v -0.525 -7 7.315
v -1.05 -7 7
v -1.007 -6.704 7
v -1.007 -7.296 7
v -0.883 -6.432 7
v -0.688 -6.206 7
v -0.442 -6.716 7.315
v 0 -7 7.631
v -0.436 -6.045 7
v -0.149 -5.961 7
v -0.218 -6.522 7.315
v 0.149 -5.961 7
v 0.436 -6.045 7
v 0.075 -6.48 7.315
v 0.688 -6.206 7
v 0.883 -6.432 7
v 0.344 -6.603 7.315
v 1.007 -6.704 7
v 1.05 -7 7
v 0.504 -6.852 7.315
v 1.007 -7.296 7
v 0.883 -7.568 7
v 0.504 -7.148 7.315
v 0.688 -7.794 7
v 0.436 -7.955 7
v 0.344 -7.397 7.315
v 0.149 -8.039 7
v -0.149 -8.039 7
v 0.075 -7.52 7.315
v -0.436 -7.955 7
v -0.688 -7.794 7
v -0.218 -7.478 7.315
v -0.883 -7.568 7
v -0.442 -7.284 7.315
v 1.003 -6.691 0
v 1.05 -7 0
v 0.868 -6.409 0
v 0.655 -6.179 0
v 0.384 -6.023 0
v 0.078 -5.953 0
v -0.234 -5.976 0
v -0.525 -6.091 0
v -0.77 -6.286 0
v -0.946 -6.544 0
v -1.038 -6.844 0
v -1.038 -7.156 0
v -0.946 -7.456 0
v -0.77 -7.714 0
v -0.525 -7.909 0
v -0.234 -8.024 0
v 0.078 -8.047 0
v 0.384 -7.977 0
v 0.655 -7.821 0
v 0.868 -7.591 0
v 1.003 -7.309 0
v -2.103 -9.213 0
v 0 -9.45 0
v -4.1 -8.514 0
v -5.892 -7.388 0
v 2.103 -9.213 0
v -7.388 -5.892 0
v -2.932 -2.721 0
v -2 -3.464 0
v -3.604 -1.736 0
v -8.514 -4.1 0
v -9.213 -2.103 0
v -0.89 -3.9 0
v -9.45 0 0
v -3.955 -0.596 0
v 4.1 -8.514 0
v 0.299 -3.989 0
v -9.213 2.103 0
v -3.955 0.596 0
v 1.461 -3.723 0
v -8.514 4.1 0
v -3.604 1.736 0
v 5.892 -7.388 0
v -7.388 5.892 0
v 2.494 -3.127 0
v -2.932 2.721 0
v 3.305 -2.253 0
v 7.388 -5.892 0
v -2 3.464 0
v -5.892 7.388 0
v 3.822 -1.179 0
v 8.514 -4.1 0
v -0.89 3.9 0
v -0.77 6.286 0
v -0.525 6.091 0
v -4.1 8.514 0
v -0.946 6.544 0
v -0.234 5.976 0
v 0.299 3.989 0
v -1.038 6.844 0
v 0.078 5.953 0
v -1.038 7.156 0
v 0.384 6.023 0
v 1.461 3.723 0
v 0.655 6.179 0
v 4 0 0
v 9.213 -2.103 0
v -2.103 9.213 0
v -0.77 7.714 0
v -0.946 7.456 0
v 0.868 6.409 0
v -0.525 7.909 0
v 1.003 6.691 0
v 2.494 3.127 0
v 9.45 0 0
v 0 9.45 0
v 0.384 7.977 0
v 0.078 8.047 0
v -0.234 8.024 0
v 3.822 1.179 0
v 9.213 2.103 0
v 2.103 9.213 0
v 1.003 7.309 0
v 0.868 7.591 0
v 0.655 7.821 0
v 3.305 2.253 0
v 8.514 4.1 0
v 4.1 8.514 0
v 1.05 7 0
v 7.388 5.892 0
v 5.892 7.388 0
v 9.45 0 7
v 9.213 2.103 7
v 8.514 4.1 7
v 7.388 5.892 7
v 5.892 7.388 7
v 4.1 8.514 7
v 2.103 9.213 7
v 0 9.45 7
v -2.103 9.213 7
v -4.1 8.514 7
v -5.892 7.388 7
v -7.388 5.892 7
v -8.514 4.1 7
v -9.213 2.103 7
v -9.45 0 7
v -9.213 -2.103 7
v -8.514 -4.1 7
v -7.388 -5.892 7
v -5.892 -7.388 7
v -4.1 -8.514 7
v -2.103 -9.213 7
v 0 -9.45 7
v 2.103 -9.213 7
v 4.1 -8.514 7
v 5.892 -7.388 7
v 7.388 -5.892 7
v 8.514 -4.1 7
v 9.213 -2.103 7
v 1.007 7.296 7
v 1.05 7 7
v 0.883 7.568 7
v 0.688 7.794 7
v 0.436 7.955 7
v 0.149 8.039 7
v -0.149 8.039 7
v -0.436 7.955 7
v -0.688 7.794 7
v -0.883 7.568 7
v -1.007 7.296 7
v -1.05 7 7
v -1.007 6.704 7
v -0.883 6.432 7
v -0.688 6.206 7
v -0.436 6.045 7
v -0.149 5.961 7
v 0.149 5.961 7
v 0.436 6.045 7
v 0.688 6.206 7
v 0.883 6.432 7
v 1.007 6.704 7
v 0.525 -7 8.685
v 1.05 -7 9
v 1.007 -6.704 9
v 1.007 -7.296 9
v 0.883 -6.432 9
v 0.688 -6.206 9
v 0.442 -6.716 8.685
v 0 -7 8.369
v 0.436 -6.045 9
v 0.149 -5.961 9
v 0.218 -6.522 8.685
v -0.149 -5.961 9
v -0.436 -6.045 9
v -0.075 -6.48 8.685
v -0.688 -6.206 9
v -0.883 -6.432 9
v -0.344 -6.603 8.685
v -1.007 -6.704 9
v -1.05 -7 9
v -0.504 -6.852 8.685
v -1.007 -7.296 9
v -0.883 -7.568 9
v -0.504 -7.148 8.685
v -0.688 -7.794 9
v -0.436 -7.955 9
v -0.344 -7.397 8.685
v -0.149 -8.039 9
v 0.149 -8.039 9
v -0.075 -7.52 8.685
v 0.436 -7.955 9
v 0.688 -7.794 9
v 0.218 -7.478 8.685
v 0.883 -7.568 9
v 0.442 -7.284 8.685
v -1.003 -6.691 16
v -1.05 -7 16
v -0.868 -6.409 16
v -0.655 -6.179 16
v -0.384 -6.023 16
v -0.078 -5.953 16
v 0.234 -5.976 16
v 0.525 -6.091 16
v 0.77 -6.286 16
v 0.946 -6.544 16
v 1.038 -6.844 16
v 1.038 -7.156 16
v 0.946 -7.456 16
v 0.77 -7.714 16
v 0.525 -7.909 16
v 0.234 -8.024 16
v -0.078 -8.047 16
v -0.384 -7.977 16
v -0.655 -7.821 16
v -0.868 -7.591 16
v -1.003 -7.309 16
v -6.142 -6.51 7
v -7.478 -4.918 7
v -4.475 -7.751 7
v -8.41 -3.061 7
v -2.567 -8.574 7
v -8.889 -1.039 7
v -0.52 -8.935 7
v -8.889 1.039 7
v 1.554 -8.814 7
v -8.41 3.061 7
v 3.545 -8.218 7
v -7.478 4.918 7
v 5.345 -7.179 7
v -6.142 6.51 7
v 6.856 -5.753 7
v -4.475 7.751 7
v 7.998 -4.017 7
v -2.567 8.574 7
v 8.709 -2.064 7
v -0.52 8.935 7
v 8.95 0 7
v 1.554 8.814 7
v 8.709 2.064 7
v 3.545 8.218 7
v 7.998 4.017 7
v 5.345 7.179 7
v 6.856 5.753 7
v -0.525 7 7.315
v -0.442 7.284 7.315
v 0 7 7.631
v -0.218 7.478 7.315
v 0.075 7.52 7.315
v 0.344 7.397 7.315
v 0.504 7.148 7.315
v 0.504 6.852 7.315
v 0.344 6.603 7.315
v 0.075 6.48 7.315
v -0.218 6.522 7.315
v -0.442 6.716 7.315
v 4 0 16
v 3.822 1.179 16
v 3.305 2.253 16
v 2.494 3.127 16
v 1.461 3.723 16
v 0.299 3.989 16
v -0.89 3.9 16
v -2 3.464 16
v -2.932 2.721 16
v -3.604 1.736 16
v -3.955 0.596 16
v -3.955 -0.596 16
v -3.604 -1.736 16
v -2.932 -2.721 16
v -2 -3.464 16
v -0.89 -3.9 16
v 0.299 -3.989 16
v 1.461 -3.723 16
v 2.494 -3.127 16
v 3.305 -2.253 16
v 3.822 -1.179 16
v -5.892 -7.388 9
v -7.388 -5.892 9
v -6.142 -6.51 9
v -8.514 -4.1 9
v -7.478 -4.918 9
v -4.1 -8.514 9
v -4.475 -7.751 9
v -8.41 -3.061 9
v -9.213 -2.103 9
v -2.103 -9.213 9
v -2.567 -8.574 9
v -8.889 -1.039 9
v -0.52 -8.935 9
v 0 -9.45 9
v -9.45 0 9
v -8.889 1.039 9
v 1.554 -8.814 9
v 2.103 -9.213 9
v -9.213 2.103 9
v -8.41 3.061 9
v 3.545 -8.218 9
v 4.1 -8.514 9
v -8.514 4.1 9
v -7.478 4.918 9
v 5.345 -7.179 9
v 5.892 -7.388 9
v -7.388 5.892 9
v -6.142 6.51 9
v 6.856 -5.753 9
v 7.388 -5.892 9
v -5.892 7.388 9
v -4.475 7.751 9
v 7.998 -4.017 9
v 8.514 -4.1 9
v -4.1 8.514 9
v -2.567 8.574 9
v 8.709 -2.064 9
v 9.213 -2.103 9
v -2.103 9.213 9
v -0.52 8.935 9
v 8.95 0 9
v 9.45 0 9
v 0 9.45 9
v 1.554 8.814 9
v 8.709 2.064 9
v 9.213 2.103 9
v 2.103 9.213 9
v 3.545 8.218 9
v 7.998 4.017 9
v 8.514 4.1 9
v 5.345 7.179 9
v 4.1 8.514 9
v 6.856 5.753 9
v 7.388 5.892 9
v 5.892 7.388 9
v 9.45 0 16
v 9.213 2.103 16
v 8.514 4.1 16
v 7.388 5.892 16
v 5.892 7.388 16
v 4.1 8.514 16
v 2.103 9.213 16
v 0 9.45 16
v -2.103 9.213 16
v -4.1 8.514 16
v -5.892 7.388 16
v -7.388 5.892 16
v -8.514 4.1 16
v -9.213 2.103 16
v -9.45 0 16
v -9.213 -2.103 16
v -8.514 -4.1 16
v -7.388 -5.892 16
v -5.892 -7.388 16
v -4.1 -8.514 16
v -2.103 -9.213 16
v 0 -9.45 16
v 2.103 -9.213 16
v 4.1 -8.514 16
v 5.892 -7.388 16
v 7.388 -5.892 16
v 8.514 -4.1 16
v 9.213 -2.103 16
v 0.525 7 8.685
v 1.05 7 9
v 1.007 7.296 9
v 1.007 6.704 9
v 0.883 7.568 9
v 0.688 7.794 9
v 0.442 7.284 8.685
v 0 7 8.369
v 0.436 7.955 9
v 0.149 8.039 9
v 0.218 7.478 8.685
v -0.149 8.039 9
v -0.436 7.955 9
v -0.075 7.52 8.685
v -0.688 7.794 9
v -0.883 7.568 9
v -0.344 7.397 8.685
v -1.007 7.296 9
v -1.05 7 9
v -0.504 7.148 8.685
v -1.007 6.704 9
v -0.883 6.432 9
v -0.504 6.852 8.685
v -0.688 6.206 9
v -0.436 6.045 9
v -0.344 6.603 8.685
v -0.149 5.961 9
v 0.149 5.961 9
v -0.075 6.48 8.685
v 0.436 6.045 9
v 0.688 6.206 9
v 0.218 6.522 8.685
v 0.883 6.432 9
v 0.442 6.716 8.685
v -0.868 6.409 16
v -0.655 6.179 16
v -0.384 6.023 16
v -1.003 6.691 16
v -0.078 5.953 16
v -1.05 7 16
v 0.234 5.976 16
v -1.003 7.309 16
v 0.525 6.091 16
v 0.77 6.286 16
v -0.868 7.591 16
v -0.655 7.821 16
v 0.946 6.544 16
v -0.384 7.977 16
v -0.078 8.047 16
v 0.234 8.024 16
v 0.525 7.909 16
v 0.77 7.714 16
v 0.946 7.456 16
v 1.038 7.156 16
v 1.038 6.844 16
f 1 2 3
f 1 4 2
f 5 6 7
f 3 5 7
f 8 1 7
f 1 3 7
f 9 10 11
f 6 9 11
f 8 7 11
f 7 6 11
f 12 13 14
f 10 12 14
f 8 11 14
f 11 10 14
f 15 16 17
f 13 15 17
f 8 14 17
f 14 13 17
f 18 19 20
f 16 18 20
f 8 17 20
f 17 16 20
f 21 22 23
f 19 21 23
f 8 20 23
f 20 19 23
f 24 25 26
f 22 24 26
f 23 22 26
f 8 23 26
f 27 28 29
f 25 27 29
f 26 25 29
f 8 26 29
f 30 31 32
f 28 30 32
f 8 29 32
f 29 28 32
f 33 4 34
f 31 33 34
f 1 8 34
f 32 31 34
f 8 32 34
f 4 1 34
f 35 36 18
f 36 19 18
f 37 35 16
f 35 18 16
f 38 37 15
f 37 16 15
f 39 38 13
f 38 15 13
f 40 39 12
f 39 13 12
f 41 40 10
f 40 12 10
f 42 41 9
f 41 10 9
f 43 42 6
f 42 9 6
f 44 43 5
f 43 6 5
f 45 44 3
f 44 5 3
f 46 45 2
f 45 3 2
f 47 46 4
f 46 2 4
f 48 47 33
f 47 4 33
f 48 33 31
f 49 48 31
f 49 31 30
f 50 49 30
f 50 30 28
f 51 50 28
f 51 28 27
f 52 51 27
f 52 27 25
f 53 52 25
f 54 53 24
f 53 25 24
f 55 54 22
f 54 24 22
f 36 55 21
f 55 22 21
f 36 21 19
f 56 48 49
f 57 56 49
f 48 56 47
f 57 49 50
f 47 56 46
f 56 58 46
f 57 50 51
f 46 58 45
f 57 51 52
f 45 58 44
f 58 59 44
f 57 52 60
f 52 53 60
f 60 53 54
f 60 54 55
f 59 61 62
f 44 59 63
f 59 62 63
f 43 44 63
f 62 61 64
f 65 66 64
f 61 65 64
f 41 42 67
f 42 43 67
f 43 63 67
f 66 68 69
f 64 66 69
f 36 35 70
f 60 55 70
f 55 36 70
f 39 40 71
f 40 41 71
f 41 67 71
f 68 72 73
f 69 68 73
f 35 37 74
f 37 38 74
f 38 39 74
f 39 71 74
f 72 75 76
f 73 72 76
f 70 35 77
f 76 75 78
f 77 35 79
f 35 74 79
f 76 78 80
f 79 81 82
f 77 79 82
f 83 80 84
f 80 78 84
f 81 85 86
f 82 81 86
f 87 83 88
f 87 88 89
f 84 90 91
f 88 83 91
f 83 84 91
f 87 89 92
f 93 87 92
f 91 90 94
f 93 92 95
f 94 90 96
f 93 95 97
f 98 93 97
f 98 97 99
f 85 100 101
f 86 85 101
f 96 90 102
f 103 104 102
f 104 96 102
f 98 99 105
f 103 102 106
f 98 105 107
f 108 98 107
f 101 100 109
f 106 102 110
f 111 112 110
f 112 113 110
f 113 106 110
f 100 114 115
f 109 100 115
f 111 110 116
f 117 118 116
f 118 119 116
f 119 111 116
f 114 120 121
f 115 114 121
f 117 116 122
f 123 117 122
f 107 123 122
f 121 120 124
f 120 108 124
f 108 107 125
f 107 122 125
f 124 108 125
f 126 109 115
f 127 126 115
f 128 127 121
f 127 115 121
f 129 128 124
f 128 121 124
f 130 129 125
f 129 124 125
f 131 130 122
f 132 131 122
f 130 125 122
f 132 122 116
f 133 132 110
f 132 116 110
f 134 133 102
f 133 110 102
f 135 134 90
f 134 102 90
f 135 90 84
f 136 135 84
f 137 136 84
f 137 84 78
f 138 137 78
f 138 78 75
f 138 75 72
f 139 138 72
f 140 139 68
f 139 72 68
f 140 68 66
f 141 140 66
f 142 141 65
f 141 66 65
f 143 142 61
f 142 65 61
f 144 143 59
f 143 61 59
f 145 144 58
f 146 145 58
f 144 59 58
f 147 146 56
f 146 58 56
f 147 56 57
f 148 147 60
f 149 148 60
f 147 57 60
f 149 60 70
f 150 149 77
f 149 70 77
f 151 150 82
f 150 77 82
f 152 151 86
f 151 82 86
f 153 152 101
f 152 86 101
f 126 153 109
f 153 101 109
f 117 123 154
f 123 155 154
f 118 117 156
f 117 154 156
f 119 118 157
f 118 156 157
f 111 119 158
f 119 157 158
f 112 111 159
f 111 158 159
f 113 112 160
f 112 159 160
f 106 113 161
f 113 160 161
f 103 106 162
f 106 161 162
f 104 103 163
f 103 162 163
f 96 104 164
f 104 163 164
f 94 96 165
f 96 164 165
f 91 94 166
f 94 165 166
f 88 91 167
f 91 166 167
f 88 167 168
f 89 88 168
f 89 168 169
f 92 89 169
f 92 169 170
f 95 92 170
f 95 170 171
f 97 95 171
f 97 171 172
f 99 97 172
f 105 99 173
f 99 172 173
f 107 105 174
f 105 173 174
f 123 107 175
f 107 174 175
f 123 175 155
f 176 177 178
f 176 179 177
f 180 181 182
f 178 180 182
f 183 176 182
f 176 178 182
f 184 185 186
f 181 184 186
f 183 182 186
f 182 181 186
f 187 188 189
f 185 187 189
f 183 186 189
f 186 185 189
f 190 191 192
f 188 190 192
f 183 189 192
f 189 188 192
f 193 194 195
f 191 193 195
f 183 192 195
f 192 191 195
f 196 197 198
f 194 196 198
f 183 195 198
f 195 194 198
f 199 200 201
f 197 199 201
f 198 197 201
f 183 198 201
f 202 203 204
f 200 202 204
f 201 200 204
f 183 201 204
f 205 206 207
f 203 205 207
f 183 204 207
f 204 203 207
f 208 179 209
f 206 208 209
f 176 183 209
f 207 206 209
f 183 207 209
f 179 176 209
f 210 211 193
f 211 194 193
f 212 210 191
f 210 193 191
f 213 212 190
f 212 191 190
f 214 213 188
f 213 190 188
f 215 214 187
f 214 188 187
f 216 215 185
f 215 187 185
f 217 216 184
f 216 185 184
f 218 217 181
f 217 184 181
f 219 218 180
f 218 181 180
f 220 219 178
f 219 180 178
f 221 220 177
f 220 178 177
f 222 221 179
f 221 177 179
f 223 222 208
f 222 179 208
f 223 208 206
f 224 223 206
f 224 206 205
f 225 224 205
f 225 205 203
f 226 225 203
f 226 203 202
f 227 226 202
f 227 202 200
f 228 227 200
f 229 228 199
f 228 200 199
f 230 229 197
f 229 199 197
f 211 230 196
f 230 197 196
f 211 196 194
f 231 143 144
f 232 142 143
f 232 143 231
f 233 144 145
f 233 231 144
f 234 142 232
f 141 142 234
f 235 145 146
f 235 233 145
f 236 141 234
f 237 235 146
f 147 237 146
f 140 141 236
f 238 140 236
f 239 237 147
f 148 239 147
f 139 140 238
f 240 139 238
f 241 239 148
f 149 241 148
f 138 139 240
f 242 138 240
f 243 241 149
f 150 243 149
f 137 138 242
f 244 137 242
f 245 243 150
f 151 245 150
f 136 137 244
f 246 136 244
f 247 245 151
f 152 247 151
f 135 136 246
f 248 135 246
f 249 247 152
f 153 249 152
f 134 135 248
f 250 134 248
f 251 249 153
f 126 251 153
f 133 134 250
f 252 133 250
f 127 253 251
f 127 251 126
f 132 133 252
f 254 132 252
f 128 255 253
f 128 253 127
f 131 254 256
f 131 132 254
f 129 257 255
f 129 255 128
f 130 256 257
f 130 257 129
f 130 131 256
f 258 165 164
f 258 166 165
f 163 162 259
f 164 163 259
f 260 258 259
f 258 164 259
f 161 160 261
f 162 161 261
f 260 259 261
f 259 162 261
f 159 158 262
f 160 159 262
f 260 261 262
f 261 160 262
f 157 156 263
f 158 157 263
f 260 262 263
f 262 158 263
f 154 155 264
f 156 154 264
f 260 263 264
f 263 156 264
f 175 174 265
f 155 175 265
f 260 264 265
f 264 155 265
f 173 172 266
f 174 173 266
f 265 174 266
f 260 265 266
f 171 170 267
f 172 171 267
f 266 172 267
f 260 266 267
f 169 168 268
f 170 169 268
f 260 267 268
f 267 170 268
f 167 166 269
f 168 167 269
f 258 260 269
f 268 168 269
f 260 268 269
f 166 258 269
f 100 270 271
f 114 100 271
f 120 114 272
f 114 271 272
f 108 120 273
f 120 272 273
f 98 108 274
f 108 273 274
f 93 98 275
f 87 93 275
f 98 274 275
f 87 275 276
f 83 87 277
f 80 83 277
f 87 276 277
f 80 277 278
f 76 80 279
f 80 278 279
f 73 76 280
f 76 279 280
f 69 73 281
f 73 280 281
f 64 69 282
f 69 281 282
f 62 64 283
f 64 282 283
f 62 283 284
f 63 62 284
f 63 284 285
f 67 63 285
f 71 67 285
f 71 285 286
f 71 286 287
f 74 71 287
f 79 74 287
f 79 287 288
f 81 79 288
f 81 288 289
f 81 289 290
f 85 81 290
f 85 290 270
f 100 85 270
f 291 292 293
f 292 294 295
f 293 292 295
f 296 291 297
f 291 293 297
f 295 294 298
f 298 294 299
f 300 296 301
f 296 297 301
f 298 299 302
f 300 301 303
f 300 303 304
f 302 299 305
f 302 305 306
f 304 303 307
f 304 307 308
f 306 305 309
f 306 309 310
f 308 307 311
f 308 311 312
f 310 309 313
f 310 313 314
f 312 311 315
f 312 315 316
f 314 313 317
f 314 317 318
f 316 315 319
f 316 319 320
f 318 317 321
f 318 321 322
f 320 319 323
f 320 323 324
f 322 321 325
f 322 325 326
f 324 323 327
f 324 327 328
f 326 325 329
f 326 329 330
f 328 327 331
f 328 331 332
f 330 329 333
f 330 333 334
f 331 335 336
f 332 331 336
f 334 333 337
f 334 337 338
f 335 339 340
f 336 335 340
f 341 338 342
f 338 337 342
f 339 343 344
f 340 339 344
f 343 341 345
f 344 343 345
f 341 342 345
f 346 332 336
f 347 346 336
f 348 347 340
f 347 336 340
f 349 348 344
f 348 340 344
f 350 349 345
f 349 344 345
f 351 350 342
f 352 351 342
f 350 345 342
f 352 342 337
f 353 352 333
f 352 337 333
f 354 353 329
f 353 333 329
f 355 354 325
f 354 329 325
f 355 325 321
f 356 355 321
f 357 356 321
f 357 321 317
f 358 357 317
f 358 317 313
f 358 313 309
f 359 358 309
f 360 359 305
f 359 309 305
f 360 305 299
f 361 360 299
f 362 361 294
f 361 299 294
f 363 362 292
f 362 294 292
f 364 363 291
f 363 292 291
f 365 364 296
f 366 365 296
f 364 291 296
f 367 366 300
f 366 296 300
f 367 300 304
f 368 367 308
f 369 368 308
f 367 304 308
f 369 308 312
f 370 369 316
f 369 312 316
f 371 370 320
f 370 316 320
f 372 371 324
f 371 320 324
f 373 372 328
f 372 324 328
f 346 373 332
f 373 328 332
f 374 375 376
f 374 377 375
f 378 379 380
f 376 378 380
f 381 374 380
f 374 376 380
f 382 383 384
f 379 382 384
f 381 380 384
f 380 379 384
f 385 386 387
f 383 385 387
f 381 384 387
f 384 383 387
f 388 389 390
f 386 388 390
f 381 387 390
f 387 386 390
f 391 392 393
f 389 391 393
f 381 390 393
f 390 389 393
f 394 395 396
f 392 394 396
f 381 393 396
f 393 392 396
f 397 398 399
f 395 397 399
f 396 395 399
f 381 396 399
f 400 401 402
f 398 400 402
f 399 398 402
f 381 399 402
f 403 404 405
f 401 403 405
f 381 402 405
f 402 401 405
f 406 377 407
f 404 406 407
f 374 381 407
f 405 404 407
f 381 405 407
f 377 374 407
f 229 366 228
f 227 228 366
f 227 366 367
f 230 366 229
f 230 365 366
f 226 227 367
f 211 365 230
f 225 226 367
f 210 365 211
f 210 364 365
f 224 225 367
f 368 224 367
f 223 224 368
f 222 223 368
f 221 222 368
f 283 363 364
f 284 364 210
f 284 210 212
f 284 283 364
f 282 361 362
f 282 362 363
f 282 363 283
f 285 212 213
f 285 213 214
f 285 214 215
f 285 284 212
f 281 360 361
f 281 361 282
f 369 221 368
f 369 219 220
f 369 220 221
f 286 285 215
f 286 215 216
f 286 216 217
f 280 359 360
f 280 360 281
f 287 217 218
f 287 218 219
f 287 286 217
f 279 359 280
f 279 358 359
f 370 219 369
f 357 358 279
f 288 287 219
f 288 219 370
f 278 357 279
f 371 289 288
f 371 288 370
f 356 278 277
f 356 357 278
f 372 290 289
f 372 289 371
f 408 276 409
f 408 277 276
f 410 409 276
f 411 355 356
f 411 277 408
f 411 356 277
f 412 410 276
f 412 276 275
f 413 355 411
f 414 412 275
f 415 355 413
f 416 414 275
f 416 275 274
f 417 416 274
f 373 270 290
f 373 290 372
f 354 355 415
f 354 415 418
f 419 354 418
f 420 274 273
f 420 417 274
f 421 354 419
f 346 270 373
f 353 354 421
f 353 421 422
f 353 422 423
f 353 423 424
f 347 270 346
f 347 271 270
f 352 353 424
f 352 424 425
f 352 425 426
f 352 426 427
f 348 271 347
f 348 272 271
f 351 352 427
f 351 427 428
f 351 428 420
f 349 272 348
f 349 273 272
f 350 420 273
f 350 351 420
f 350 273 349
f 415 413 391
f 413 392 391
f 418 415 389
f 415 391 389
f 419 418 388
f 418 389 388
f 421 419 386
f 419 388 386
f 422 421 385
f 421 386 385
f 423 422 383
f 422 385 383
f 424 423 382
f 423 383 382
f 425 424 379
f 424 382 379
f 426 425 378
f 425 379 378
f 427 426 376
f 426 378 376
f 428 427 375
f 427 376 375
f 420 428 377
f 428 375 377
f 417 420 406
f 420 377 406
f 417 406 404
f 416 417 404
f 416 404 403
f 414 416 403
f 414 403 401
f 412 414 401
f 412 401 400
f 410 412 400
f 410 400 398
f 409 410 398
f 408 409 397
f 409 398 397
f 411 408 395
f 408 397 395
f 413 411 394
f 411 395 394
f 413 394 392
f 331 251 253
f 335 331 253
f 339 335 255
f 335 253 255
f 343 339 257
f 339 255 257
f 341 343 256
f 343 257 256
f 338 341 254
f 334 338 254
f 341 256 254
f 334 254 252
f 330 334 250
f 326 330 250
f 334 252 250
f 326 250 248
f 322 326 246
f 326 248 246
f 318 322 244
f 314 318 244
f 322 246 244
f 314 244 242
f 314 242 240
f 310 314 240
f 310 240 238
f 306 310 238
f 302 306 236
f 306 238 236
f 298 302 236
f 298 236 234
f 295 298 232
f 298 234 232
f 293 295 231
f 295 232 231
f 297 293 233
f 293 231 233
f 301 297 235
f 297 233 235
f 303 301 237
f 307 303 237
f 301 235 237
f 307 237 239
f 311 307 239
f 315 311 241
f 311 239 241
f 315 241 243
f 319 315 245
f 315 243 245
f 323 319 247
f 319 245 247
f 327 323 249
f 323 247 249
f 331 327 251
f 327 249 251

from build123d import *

# Parameters (mm, degrees)
SKETCH1_R                    = 9.45
BOSS_EXTRUDE1_DEPTH          = 7
SKETCH2_R                    = 8.95
BOSS_EXTRUDE2_DEPTH          = 2
SKETCH3_R                    = 9.45
BOSS_EXTRUDE3_DEPTH          = 7
SKETCH4_R                    = 4
CUT_EXTRUDE1_DEPTH           = 21.847182064
M2_5X0_45_TAPPED_HOLE1_D     = 2.1
M2_5X0_45_TAPPED_HOLE1_DEPTH = 7
M2_5X0_45_TAPPED_HOLE1_TIP   = 0.63090365
M2_5X0_45_TAPPED_HOLE2_D     = 2.1
M2_5X0_45_TAPPED_HOLE2_DEPTH = 7
M2_5X0_45_TAPPED_HOLE2_TIP   = 0.63090365


with BuildPart() as part:
    # Sketch1 → Boss-Extrude1 (new body)
    with BuildSketch(Plane.XY):
        Circle(SKETCH1_R)
    extrude(amount=BOSS_EXTRUDE1_DEPTH)

    # Sketch2 → Boss-Extrude2 (add)
    with BuildSketch(Plane.XY.offset(7)):
        Circle(SKETCH2_R)
    extrude(amount=BOSS_EXTRUDE2_DEPTH)

    # Sketch3 → Boss-Extrude3 (add)
    with BuildSketch(Plane.XY.offset(9)):
        Circle(SKETCH3_R)
    extrude(amount=BOSS_EXTRUDE3_DEPTH)

    # Sketch4 → Cut-Extrude1 (cut, through all)
    with BuildSketch(Plane.XY.offset(16)):
        Circle(SKETCH4_R)
    extrude(amount=-CUT_EXTRUDE1_DEPTH, mode=Mode.SUBTRACT)

    # M2.5x0.45 Tapped Hole1
    with Locations(Plane.XY.offset(16)):
        with Locations((0, -7), (0, 7)):
            Hole(M2_5X0_45_TAPPED_HOLE1_D / 2, depth=M2_5X0_45_TAPPED_HOLE1_DEPTH)
            with Locations((0, 0, -(M2_5X0_45_TAPPED_HOLE1_DEPTH + M2_5X0_45_TAPPED_HOLE1_TIP / 2))):  # 118° drill point
                Cone(0, M2_5X0_45_TAPPED_HOLE1_D / 2, M2_5X0_45_TAPPED_HOLE1_TIP, mode=Mode.SUBTRACT)

    # M2.5x0.45 Tapped Hole2
    with Locations(Plane(origin=(0, 0, 0), x_dir=(-1, 0, 0), z_dir=(0, 0, -1))):
        with Locations((0, 7), (0, -7)):
            Hole(M2_5X0_45_TAPPED_HOLE2_D / 2, depth=M2_5X0_45_TAPPED_HOLE2_DEPTH)
            with Locations((0, 0, -(M2_5X0_45_TAPPED_HOLE2_DEPTH + M2_5X0_45_TAPPED_HOLE2_TIP / 2))):  # 118° drill point
                Cone(0, M2_5X0_45_TAPPED_HOLE2_D / 2, M2_5X0_45_TAPPED_HOLE2_TIP, mode=Mode.SUBTRACT)


solid = part.part
